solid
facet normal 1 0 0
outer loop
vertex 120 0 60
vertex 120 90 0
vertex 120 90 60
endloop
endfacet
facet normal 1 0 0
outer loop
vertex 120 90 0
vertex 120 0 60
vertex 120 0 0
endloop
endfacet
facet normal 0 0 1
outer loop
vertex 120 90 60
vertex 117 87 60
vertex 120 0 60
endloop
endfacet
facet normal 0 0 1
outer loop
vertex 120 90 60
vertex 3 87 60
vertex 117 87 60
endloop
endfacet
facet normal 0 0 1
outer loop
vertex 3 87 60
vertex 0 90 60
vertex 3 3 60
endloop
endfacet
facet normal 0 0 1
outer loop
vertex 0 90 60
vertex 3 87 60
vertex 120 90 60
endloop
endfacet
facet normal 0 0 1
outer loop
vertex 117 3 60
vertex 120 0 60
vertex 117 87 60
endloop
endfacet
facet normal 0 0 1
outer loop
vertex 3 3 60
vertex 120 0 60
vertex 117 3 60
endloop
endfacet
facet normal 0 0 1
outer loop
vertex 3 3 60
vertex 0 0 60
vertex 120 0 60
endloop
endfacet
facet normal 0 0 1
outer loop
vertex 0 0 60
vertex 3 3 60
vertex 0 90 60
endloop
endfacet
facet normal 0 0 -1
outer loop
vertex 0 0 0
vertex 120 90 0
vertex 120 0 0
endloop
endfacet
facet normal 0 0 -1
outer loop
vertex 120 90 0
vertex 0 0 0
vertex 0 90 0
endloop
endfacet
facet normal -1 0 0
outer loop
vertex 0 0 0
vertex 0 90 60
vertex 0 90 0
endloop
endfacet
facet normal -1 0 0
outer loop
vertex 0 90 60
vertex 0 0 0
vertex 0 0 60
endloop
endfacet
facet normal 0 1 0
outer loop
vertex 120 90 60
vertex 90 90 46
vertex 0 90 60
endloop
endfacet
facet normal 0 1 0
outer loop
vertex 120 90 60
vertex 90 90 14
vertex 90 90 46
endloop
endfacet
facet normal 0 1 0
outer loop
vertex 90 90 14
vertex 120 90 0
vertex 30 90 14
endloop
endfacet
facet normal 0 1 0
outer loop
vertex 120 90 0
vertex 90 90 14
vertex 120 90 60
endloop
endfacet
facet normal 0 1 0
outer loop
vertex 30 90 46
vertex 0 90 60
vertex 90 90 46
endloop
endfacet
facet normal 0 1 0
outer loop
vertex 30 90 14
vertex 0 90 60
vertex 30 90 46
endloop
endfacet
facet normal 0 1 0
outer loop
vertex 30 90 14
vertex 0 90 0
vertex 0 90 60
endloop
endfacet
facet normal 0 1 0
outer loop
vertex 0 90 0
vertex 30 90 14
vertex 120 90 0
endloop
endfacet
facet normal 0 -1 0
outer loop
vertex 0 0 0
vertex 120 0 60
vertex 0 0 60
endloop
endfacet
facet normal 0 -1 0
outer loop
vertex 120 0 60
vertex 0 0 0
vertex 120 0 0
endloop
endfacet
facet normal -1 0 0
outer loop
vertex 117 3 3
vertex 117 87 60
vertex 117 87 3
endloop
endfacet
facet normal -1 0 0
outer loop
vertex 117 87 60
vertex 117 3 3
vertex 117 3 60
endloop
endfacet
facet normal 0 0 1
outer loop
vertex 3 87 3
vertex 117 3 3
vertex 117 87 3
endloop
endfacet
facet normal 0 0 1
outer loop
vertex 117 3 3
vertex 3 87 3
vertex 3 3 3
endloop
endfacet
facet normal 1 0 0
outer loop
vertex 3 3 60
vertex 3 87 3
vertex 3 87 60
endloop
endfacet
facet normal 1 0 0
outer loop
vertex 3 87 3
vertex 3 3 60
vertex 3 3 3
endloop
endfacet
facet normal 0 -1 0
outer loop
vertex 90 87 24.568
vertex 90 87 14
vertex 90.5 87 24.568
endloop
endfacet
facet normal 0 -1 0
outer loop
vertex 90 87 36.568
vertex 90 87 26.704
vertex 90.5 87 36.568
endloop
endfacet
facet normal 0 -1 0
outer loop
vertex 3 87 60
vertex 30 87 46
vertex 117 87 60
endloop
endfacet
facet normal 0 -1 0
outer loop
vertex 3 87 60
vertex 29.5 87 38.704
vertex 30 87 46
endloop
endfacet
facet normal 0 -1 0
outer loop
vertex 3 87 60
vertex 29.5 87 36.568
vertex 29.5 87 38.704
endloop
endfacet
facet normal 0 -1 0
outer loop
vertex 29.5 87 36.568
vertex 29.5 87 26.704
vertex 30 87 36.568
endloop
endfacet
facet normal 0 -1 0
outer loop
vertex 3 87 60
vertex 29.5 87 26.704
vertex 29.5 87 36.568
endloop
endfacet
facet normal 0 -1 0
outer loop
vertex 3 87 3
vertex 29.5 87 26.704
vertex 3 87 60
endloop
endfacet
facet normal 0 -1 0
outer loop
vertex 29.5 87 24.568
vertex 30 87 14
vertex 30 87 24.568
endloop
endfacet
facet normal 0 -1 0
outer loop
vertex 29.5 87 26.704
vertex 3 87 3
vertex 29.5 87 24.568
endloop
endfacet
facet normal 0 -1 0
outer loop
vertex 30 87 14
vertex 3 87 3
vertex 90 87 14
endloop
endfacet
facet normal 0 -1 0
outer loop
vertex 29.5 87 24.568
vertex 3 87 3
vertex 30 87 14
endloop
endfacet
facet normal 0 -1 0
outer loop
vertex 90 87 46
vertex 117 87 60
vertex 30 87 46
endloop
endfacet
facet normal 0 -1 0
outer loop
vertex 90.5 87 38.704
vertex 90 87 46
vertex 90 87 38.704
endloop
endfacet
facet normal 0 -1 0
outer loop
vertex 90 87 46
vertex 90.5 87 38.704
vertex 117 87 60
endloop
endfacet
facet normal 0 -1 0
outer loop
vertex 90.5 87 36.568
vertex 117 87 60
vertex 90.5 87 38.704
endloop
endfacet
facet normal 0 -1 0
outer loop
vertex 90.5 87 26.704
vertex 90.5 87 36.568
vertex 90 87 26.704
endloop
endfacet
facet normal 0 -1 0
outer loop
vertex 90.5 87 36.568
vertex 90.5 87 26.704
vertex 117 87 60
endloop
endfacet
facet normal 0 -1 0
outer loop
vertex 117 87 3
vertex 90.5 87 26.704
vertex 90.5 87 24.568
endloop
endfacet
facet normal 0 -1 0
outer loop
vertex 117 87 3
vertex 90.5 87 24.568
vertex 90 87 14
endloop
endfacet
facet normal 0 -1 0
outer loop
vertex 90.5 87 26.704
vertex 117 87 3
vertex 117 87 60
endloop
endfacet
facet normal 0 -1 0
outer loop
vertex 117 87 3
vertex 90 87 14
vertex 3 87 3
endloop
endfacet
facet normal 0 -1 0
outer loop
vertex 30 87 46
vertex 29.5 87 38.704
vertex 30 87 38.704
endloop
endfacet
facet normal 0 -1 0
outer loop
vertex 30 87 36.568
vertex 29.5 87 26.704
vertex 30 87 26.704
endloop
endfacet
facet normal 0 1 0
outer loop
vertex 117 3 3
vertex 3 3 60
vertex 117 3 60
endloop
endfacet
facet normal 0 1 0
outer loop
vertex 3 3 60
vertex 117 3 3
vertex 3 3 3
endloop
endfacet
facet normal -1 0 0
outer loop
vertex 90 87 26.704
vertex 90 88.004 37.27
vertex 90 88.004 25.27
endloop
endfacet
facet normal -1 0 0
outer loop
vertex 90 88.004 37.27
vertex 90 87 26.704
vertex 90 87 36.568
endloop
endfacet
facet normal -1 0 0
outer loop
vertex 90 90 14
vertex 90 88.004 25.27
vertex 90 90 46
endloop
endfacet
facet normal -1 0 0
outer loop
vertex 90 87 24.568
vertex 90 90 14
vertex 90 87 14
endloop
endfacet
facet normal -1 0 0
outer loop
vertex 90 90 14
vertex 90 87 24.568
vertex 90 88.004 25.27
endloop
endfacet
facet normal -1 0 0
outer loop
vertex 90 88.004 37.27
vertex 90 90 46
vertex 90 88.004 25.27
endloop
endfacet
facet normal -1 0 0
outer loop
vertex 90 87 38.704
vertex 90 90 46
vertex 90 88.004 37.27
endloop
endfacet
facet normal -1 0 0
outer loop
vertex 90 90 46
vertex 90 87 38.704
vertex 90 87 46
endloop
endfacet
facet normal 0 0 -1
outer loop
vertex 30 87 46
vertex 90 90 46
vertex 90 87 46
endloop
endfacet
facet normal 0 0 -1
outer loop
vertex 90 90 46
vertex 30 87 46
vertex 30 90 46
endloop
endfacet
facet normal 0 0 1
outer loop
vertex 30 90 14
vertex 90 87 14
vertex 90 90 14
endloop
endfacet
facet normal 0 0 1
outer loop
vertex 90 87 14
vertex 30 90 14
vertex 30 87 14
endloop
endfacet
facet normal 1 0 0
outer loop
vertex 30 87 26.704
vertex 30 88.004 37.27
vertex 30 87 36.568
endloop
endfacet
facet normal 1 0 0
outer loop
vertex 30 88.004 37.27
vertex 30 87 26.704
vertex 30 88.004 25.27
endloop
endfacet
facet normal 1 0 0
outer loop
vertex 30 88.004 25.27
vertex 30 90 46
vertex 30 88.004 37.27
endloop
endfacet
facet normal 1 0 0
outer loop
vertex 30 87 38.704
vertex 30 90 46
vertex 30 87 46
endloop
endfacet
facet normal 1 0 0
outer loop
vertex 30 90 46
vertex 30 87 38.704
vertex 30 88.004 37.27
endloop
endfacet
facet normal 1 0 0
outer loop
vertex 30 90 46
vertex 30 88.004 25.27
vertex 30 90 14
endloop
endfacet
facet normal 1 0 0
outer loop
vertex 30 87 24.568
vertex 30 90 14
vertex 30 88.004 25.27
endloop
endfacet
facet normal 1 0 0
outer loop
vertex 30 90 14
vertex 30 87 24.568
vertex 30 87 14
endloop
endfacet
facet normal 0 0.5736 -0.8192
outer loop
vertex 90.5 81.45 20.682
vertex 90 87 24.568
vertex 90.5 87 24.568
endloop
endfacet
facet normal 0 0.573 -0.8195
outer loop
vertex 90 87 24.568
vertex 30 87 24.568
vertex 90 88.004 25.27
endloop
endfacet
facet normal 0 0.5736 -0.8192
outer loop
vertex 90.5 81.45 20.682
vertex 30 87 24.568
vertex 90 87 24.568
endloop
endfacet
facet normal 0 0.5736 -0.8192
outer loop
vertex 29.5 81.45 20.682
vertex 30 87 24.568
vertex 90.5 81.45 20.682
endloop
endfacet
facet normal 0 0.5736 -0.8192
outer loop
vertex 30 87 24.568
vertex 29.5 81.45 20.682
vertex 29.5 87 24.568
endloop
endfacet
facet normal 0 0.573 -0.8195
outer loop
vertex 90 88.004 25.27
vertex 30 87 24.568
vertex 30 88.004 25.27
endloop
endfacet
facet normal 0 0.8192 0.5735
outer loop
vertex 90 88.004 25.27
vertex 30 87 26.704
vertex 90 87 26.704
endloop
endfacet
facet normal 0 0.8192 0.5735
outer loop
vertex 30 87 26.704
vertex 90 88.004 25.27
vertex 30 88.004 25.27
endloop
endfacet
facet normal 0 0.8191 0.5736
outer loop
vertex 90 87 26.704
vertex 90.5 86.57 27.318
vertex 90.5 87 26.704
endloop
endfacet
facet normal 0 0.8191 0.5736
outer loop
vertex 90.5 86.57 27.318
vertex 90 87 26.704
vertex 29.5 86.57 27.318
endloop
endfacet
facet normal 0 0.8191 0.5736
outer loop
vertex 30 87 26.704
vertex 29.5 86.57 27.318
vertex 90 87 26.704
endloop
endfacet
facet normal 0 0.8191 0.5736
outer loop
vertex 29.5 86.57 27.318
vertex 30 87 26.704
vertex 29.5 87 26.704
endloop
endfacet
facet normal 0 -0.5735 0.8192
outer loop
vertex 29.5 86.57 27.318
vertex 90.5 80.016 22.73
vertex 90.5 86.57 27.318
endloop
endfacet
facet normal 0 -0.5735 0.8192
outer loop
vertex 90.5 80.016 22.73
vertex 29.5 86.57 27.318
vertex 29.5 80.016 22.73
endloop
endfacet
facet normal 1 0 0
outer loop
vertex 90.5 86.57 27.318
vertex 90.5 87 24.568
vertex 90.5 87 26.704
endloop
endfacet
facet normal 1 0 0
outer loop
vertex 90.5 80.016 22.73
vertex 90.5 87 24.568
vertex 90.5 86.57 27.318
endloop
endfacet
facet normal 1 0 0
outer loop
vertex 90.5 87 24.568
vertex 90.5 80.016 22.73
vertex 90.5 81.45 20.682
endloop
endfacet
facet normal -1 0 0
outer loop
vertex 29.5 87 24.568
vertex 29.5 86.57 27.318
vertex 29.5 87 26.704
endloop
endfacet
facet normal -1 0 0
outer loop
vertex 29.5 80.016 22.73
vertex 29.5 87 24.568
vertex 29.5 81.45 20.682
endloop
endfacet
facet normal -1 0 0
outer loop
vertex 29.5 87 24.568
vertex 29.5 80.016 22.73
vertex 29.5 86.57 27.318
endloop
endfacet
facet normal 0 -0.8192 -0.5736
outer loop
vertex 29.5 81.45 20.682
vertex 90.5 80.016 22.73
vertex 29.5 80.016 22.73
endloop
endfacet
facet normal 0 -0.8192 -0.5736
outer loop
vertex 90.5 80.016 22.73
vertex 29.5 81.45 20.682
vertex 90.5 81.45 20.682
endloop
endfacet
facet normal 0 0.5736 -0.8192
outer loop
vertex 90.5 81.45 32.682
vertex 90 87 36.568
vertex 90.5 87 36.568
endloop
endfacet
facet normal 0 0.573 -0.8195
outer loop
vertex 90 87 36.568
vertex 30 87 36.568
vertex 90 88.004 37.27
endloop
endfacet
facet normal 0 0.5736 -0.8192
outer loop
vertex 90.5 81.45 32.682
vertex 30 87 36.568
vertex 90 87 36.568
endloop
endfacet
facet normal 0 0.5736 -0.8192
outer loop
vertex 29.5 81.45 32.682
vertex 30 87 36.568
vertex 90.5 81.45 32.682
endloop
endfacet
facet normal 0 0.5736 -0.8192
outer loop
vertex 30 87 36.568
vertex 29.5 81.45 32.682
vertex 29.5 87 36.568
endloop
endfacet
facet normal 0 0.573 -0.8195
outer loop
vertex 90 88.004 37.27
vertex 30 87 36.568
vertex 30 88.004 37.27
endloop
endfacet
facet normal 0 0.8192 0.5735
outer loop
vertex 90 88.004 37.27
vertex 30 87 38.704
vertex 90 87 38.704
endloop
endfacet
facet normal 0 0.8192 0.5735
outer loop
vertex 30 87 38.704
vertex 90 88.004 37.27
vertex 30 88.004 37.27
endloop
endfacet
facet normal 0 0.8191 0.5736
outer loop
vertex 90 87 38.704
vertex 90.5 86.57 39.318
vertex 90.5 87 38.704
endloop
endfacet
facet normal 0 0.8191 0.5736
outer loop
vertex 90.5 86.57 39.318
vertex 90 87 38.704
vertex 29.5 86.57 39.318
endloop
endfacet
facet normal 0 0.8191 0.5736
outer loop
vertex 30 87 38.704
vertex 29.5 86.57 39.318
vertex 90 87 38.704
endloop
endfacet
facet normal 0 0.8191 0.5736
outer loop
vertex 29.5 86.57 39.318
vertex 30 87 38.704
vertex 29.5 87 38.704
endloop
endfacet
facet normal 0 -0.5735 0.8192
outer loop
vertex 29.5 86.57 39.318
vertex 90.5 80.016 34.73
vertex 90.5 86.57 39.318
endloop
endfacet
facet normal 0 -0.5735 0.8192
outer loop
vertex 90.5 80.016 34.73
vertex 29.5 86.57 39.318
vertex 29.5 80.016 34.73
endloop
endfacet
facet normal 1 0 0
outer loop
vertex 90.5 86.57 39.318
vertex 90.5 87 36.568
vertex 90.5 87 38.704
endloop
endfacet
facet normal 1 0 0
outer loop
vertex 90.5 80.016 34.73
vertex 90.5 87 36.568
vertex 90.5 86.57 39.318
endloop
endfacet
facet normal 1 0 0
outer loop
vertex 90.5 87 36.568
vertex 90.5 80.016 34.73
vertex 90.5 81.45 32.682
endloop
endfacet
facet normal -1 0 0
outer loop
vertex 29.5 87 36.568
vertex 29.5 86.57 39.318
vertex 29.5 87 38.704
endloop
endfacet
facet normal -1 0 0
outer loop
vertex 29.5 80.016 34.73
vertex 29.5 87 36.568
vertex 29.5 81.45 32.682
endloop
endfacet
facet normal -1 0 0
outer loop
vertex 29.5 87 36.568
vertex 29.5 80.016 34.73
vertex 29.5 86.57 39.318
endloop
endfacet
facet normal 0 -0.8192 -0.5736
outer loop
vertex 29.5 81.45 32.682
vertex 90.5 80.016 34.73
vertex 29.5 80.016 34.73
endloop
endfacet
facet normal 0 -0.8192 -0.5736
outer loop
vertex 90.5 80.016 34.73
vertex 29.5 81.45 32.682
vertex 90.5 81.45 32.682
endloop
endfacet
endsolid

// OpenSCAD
$fn = 32;

// ----------------------------------------------------------------------
// Vent box: louvers enclosure
// ----------------------------------------------------------------------

// --- parameters (mm) ---
box_l = 120;              // box length, X
box_w = 90;               // box width, Y
box_h = 60;               // box height, Z
wall_t = 3;               // shell wall thickness
win_l = 60;               // vent window width, X
win_h = 32;               // vent window height, Z
slat_t = 2.5;             // louver slat thickness
slat_d = 8;               // louver slat depth
slat_a = 35;              // louver slat angle, degrees
slat_pitch = 12;          // louver pitch
slat_yc = 84.01;          // slat centreline Y

win_z0 = (box_h - win_h) / 2;  // window lower edge Z
n_slats = 2;  // louver count
slat_z0 = win_z0 + (win_h - (n_slats - 1) * slat_pitch) / 2;

difference() {
  union() {
    difference() {
      cube([box_l, box_w, box_h]);
  translate([wall_t, wall_t, wall_t])
    cube([box_l - 2 * wall_t, box_w - 2 * wall_t, box_h]);
  translate([(box_l - win_l) / 2, box_w - wall_t - 1, win_z0])
    cube([win_l, wall_t + 2, win_h]);
    }
    for (i = [0 : n_slats - 1])
      translate([box_l / 2, slat_yc, slat_z0 + i * slat_pitch])
        rotate([slat_a, 0, 0])
          cube([win_l + 1, slat_d, slat_t], center = true);
  }
}
